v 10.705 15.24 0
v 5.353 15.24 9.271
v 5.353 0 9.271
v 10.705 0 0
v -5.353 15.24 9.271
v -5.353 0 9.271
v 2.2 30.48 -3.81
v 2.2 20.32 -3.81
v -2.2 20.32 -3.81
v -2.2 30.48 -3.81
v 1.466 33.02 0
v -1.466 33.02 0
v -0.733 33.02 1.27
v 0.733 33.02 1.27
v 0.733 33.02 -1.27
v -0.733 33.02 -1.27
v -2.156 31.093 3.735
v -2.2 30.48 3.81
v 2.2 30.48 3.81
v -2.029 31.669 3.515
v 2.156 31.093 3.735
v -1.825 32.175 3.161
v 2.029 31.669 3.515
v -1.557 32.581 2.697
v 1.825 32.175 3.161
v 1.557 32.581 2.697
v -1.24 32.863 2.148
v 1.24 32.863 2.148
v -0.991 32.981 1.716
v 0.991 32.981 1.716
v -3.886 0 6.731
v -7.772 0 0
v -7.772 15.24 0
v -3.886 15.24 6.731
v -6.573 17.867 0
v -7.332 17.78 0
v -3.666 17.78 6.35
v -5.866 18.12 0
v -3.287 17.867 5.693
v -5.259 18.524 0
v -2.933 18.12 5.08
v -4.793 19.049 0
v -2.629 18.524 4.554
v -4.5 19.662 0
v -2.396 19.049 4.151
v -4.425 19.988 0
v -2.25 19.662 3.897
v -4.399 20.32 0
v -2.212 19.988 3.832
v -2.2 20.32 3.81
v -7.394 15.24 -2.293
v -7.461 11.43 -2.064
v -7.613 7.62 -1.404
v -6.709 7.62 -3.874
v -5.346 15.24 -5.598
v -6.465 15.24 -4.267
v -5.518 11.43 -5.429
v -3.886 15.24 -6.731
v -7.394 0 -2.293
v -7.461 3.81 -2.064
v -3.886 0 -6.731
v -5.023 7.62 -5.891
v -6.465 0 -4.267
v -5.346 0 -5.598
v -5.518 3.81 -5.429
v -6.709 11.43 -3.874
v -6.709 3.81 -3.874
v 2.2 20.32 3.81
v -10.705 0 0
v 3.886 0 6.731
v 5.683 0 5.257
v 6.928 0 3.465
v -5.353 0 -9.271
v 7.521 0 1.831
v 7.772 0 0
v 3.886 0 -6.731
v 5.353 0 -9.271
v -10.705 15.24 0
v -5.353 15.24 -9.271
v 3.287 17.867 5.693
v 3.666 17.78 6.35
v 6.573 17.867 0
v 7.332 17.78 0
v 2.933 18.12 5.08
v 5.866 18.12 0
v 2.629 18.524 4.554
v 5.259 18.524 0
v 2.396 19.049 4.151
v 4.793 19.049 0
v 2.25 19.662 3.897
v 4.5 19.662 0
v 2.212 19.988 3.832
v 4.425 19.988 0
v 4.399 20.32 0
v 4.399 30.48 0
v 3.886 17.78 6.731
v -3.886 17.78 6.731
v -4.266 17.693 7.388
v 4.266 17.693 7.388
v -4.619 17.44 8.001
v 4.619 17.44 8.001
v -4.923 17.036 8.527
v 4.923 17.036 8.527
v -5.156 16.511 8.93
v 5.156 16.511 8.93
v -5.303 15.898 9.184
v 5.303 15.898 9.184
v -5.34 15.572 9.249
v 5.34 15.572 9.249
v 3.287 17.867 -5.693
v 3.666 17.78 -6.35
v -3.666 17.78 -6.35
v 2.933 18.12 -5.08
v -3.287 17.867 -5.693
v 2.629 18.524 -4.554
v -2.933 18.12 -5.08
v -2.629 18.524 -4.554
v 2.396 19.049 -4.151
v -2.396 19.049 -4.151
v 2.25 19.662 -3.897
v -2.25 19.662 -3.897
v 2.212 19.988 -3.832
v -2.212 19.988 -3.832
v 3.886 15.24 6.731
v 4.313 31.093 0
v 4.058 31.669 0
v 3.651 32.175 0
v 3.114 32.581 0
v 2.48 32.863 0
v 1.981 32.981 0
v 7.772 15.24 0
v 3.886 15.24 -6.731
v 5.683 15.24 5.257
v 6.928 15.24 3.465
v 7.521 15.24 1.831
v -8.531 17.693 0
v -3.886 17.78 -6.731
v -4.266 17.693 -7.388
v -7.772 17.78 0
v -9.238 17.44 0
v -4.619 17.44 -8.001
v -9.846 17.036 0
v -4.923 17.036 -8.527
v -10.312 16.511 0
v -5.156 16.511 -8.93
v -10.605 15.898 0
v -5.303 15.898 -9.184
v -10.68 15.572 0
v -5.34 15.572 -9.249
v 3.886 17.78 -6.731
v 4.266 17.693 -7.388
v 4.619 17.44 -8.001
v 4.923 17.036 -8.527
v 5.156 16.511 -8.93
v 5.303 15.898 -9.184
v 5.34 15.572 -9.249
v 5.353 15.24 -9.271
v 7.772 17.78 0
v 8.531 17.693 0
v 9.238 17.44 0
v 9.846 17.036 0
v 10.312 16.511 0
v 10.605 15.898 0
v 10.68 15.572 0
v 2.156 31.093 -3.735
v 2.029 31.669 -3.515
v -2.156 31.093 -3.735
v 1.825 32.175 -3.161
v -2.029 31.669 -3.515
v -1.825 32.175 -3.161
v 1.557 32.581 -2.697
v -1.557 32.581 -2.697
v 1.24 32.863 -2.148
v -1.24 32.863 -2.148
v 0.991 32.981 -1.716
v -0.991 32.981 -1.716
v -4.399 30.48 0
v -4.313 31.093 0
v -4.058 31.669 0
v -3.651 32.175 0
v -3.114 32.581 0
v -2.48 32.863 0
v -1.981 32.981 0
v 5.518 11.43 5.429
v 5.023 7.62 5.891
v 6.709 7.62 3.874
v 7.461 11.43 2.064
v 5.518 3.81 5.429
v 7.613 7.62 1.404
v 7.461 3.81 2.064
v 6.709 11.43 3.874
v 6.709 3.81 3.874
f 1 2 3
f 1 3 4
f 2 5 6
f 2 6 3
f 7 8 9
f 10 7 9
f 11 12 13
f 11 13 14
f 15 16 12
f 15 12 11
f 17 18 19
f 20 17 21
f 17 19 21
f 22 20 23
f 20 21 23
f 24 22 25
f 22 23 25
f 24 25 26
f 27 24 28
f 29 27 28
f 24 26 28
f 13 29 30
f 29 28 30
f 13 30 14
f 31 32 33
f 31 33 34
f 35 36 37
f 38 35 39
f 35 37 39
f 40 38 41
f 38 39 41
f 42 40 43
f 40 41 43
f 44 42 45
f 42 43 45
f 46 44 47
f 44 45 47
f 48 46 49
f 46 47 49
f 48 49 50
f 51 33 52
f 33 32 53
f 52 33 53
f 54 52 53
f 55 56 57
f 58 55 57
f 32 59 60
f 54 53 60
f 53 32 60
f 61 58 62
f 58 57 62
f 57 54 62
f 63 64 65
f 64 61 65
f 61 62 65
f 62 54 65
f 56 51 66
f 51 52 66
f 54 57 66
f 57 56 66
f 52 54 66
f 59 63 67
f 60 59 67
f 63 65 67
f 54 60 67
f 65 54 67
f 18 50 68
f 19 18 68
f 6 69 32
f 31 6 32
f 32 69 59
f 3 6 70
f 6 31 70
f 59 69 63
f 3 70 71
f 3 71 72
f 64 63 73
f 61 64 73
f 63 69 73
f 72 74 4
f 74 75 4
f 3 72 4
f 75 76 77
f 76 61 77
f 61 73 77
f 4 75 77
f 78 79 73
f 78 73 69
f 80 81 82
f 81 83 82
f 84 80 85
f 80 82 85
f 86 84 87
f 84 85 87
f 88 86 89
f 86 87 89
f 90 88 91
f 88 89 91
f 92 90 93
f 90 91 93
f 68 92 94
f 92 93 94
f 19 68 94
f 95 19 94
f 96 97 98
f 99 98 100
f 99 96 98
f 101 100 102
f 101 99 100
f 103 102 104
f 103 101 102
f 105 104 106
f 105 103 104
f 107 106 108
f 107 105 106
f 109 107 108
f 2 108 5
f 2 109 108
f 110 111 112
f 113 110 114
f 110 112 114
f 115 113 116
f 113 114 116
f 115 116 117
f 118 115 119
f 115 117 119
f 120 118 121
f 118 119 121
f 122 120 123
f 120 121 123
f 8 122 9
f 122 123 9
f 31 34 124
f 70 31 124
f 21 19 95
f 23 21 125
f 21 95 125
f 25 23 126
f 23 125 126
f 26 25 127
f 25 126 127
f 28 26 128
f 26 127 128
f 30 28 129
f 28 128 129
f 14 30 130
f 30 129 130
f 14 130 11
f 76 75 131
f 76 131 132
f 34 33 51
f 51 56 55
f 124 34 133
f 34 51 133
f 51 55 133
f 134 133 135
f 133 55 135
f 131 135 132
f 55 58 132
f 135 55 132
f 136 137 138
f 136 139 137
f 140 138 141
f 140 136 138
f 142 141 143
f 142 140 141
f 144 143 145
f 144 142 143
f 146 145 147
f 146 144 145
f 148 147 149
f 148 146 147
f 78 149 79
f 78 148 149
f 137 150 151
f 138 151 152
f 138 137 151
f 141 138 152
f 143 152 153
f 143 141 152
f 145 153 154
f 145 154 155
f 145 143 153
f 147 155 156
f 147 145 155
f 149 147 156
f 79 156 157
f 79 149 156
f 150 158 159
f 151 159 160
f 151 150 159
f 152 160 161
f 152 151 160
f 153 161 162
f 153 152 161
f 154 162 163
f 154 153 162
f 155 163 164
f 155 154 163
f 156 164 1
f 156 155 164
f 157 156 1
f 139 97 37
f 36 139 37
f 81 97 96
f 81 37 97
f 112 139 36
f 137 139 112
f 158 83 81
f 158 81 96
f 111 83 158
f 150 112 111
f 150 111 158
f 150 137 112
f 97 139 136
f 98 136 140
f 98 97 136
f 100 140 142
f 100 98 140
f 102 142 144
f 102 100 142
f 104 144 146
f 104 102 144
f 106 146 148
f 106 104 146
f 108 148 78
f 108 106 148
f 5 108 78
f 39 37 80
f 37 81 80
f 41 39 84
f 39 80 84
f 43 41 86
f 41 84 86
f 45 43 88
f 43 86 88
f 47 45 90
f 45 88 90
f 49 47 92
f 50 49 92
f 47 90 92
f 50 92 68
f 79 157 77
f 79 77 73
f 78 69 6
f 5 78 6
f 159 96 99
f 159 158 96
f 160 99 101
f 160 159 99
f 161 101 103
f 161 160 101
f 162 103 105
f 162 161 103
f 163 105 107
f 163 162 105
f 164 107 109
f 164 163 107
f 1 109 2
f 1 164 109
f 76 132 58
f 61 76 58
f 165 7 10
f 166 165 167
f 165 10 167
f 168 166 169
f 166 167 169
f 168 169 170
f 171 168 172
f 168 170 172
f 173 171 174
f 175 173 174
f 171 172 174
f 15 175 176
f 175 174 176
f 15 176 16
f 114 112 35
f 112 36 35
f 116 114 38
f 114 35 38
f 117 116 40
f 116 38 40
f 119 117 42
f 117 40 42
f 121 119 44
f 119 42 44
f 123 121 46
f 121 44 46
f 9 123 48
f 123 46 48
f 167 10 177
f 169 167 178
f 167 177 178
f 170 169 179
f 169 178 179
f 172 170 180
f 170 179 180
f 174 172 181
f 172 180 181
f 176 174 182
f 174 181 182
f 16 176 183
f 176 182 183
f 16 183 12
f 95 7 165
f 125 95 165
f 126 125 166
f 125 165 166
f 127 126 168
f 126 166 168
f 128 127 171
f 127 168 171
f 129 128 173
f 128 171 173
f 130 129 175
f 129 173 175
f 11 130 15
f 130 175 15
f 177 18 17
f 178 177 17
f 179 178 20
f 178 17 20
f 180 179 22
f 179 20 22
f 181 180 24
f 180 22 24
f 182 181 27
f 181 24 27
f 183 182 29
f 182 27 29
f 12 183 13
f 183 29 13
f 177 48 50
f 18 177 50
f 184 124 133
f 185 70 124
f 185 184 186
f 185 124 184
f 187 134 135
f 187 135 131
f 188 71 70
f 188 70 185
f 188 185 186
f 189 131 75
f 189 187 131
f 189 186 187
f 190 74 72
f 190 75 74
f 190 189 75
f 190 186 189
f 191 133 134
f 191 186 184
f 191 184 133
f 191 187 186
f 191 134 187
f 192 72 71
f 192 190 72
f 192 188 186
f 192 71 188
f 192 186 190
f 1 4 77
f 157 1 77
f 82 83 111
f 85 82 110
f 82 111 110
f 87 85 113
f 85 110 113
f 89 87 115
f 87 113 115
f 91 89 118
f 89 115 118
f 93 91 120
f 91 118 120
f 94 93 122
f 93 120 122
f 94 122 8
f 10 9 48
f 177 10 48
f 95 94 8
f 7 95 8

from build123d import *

# Parameters (mm, degrees)
BOSS_EXTRUDE1_DEPTH = 15.24
BOSS_EXTRUDE2_DEPTH = 2.54
BOSS_EXTRUDE3_DEPTH = 15.24
CUT_EXTRUDE3_DEPTH  = 15.24
FILLET9_R           = 2.54
CUT_EXTRUDE4_DEPTH  = 15.24
FILLET1_R           = 2.54


with BuildPart() as part:
    # Sketch1 → Boss-Extrude1 (new body)
    with BuildSketch(Plane(origin=(0, 0, 0), x_dir=(1, 0, 0), z_dir=(0, 1, 0))):
        Polygon((10.705228691, 0), (5.352614346, 9.271), (-5.352614346, 9.271), (-10.705228691, 0), (-5.352614346, -9.271), (5.352614346, -9.271), align=None)
        Polygon((7.772289324, 0), (3.886144662, 6.731), (-3.886144662, 6.731), (-7.772289324, 0), (-3.886144662, -6.731), (3.886144662, -6.731), align=None, mode=Mode.SUBTRACT)
    extrude(amount=BOSS_EXTRUDE1_DEPTH)

    # Sketch2 → Boss-Extrude2 (add)
    with BuildSketch(Plane(origin=(0, 15.24, 0), x_dir=(1, 0, 0), z_dir=(0, 1, 0))):
        Polygon((10.705228691, 0), (5.352614346, 9.271), (-5.352614346, 9.271), (-10.705228691, 0), (-5.352614346, -9.271), (5.352614346, -9.271), align=None)
    extrude(amount=BOSS_EXTRUDE2_DEPTH)

    # Sketch3 → Boss-Extrude3 (add)
    with BuildSketch(Plane(origin=(0, 17.78, 0), x_dir=(1, 0, 0), z_dir=(0, 1, 0))):
        Polygon((4.399409051, 0), (2.199704526, 3.81), (-2.199704526, 3.81), (-4.399409051, 0), (-2.199704526, -3.81), (2.199704526, -3.81), align=None)
    extrude(amount=BOSS_EXTRUDE3_DEPTH)

    # Sketch8 → Cut-Extrude3 (cut)
    with BuildSketch(Plane.XZ):
        with BuildLine():
            Line((3.886144662, 6.731), (7.772289324, 0))
            add(Edge.make_bspline(
                [(3.886144662, 6.731), (7.588980613, 4.3815), (7.772289324, 0)],
                knots=[0, 0, 0, 1, 1, 1], degree=2))
        make_face()
    extrude(amount=-CUT_EXTRUDE3_DEPTH, mode=Mode.SUBTRACT)

    # Fillet9
    fillet9_edges = [part.edges().sort_by_distance(p)[0] for p in [
        (3.299556788, 17.78, 1.905),
        (3.299556788, 17.78, -1.905),
        (0, 17.78, -3.81),
        (-3.299556788, 17.78, -1.905),
        (-3.299556788, 17.78, 1.905),
        (0, 17.78, 3.81),
        (3.299556788, 33.02, 1.905),
        (3.299556788, 33.02, -1.905),
        (0, 33.02, -3.81),
        (-3.299556788, 33.02, -1.905),
        (-3.299556788, 33.02, 1.905),
        (0, 33.02, 3.81),
    ]]
    fillet(fillet9_edges, radius=FILLET9_R)

    # Sketch9 → Cut-Extrude4 (cut)
    with BuildSketch(Plane.XZ):
        with BuildLine():
            Line((-7.772289324, 0), (-3.886144662, -6.731))
            add(Edge.make_bspline(
                [(-7.772289324, 0), (-7.588980613, -4.3815), (-3.886144662, -6.731)],
                knots=[0, 0, 0, 1, 1, 1], degree=2))
        make_face()
    extrude(amount=-CUT_EXTRUDE4_DEPTH, mode=Mode.SUBTRACT)

    # Fillet1
    fillet1_edges = [part.edges().sort_by_distance(p)[0] for p in [
        (8.028921518, 17.78, 4.6355),
        (8.028921518, 17.78, -4.6355),
        (0, 17.78, -9.271),
        (-8.028921518, 17.78, -4.6355),
        (-8.028921518, 17.78, 4.6355),
        (0, 17.78, 9.271),
    ]]
    fillet(fillet1_edges, radius=FILLET1_R)


solid = part.part
